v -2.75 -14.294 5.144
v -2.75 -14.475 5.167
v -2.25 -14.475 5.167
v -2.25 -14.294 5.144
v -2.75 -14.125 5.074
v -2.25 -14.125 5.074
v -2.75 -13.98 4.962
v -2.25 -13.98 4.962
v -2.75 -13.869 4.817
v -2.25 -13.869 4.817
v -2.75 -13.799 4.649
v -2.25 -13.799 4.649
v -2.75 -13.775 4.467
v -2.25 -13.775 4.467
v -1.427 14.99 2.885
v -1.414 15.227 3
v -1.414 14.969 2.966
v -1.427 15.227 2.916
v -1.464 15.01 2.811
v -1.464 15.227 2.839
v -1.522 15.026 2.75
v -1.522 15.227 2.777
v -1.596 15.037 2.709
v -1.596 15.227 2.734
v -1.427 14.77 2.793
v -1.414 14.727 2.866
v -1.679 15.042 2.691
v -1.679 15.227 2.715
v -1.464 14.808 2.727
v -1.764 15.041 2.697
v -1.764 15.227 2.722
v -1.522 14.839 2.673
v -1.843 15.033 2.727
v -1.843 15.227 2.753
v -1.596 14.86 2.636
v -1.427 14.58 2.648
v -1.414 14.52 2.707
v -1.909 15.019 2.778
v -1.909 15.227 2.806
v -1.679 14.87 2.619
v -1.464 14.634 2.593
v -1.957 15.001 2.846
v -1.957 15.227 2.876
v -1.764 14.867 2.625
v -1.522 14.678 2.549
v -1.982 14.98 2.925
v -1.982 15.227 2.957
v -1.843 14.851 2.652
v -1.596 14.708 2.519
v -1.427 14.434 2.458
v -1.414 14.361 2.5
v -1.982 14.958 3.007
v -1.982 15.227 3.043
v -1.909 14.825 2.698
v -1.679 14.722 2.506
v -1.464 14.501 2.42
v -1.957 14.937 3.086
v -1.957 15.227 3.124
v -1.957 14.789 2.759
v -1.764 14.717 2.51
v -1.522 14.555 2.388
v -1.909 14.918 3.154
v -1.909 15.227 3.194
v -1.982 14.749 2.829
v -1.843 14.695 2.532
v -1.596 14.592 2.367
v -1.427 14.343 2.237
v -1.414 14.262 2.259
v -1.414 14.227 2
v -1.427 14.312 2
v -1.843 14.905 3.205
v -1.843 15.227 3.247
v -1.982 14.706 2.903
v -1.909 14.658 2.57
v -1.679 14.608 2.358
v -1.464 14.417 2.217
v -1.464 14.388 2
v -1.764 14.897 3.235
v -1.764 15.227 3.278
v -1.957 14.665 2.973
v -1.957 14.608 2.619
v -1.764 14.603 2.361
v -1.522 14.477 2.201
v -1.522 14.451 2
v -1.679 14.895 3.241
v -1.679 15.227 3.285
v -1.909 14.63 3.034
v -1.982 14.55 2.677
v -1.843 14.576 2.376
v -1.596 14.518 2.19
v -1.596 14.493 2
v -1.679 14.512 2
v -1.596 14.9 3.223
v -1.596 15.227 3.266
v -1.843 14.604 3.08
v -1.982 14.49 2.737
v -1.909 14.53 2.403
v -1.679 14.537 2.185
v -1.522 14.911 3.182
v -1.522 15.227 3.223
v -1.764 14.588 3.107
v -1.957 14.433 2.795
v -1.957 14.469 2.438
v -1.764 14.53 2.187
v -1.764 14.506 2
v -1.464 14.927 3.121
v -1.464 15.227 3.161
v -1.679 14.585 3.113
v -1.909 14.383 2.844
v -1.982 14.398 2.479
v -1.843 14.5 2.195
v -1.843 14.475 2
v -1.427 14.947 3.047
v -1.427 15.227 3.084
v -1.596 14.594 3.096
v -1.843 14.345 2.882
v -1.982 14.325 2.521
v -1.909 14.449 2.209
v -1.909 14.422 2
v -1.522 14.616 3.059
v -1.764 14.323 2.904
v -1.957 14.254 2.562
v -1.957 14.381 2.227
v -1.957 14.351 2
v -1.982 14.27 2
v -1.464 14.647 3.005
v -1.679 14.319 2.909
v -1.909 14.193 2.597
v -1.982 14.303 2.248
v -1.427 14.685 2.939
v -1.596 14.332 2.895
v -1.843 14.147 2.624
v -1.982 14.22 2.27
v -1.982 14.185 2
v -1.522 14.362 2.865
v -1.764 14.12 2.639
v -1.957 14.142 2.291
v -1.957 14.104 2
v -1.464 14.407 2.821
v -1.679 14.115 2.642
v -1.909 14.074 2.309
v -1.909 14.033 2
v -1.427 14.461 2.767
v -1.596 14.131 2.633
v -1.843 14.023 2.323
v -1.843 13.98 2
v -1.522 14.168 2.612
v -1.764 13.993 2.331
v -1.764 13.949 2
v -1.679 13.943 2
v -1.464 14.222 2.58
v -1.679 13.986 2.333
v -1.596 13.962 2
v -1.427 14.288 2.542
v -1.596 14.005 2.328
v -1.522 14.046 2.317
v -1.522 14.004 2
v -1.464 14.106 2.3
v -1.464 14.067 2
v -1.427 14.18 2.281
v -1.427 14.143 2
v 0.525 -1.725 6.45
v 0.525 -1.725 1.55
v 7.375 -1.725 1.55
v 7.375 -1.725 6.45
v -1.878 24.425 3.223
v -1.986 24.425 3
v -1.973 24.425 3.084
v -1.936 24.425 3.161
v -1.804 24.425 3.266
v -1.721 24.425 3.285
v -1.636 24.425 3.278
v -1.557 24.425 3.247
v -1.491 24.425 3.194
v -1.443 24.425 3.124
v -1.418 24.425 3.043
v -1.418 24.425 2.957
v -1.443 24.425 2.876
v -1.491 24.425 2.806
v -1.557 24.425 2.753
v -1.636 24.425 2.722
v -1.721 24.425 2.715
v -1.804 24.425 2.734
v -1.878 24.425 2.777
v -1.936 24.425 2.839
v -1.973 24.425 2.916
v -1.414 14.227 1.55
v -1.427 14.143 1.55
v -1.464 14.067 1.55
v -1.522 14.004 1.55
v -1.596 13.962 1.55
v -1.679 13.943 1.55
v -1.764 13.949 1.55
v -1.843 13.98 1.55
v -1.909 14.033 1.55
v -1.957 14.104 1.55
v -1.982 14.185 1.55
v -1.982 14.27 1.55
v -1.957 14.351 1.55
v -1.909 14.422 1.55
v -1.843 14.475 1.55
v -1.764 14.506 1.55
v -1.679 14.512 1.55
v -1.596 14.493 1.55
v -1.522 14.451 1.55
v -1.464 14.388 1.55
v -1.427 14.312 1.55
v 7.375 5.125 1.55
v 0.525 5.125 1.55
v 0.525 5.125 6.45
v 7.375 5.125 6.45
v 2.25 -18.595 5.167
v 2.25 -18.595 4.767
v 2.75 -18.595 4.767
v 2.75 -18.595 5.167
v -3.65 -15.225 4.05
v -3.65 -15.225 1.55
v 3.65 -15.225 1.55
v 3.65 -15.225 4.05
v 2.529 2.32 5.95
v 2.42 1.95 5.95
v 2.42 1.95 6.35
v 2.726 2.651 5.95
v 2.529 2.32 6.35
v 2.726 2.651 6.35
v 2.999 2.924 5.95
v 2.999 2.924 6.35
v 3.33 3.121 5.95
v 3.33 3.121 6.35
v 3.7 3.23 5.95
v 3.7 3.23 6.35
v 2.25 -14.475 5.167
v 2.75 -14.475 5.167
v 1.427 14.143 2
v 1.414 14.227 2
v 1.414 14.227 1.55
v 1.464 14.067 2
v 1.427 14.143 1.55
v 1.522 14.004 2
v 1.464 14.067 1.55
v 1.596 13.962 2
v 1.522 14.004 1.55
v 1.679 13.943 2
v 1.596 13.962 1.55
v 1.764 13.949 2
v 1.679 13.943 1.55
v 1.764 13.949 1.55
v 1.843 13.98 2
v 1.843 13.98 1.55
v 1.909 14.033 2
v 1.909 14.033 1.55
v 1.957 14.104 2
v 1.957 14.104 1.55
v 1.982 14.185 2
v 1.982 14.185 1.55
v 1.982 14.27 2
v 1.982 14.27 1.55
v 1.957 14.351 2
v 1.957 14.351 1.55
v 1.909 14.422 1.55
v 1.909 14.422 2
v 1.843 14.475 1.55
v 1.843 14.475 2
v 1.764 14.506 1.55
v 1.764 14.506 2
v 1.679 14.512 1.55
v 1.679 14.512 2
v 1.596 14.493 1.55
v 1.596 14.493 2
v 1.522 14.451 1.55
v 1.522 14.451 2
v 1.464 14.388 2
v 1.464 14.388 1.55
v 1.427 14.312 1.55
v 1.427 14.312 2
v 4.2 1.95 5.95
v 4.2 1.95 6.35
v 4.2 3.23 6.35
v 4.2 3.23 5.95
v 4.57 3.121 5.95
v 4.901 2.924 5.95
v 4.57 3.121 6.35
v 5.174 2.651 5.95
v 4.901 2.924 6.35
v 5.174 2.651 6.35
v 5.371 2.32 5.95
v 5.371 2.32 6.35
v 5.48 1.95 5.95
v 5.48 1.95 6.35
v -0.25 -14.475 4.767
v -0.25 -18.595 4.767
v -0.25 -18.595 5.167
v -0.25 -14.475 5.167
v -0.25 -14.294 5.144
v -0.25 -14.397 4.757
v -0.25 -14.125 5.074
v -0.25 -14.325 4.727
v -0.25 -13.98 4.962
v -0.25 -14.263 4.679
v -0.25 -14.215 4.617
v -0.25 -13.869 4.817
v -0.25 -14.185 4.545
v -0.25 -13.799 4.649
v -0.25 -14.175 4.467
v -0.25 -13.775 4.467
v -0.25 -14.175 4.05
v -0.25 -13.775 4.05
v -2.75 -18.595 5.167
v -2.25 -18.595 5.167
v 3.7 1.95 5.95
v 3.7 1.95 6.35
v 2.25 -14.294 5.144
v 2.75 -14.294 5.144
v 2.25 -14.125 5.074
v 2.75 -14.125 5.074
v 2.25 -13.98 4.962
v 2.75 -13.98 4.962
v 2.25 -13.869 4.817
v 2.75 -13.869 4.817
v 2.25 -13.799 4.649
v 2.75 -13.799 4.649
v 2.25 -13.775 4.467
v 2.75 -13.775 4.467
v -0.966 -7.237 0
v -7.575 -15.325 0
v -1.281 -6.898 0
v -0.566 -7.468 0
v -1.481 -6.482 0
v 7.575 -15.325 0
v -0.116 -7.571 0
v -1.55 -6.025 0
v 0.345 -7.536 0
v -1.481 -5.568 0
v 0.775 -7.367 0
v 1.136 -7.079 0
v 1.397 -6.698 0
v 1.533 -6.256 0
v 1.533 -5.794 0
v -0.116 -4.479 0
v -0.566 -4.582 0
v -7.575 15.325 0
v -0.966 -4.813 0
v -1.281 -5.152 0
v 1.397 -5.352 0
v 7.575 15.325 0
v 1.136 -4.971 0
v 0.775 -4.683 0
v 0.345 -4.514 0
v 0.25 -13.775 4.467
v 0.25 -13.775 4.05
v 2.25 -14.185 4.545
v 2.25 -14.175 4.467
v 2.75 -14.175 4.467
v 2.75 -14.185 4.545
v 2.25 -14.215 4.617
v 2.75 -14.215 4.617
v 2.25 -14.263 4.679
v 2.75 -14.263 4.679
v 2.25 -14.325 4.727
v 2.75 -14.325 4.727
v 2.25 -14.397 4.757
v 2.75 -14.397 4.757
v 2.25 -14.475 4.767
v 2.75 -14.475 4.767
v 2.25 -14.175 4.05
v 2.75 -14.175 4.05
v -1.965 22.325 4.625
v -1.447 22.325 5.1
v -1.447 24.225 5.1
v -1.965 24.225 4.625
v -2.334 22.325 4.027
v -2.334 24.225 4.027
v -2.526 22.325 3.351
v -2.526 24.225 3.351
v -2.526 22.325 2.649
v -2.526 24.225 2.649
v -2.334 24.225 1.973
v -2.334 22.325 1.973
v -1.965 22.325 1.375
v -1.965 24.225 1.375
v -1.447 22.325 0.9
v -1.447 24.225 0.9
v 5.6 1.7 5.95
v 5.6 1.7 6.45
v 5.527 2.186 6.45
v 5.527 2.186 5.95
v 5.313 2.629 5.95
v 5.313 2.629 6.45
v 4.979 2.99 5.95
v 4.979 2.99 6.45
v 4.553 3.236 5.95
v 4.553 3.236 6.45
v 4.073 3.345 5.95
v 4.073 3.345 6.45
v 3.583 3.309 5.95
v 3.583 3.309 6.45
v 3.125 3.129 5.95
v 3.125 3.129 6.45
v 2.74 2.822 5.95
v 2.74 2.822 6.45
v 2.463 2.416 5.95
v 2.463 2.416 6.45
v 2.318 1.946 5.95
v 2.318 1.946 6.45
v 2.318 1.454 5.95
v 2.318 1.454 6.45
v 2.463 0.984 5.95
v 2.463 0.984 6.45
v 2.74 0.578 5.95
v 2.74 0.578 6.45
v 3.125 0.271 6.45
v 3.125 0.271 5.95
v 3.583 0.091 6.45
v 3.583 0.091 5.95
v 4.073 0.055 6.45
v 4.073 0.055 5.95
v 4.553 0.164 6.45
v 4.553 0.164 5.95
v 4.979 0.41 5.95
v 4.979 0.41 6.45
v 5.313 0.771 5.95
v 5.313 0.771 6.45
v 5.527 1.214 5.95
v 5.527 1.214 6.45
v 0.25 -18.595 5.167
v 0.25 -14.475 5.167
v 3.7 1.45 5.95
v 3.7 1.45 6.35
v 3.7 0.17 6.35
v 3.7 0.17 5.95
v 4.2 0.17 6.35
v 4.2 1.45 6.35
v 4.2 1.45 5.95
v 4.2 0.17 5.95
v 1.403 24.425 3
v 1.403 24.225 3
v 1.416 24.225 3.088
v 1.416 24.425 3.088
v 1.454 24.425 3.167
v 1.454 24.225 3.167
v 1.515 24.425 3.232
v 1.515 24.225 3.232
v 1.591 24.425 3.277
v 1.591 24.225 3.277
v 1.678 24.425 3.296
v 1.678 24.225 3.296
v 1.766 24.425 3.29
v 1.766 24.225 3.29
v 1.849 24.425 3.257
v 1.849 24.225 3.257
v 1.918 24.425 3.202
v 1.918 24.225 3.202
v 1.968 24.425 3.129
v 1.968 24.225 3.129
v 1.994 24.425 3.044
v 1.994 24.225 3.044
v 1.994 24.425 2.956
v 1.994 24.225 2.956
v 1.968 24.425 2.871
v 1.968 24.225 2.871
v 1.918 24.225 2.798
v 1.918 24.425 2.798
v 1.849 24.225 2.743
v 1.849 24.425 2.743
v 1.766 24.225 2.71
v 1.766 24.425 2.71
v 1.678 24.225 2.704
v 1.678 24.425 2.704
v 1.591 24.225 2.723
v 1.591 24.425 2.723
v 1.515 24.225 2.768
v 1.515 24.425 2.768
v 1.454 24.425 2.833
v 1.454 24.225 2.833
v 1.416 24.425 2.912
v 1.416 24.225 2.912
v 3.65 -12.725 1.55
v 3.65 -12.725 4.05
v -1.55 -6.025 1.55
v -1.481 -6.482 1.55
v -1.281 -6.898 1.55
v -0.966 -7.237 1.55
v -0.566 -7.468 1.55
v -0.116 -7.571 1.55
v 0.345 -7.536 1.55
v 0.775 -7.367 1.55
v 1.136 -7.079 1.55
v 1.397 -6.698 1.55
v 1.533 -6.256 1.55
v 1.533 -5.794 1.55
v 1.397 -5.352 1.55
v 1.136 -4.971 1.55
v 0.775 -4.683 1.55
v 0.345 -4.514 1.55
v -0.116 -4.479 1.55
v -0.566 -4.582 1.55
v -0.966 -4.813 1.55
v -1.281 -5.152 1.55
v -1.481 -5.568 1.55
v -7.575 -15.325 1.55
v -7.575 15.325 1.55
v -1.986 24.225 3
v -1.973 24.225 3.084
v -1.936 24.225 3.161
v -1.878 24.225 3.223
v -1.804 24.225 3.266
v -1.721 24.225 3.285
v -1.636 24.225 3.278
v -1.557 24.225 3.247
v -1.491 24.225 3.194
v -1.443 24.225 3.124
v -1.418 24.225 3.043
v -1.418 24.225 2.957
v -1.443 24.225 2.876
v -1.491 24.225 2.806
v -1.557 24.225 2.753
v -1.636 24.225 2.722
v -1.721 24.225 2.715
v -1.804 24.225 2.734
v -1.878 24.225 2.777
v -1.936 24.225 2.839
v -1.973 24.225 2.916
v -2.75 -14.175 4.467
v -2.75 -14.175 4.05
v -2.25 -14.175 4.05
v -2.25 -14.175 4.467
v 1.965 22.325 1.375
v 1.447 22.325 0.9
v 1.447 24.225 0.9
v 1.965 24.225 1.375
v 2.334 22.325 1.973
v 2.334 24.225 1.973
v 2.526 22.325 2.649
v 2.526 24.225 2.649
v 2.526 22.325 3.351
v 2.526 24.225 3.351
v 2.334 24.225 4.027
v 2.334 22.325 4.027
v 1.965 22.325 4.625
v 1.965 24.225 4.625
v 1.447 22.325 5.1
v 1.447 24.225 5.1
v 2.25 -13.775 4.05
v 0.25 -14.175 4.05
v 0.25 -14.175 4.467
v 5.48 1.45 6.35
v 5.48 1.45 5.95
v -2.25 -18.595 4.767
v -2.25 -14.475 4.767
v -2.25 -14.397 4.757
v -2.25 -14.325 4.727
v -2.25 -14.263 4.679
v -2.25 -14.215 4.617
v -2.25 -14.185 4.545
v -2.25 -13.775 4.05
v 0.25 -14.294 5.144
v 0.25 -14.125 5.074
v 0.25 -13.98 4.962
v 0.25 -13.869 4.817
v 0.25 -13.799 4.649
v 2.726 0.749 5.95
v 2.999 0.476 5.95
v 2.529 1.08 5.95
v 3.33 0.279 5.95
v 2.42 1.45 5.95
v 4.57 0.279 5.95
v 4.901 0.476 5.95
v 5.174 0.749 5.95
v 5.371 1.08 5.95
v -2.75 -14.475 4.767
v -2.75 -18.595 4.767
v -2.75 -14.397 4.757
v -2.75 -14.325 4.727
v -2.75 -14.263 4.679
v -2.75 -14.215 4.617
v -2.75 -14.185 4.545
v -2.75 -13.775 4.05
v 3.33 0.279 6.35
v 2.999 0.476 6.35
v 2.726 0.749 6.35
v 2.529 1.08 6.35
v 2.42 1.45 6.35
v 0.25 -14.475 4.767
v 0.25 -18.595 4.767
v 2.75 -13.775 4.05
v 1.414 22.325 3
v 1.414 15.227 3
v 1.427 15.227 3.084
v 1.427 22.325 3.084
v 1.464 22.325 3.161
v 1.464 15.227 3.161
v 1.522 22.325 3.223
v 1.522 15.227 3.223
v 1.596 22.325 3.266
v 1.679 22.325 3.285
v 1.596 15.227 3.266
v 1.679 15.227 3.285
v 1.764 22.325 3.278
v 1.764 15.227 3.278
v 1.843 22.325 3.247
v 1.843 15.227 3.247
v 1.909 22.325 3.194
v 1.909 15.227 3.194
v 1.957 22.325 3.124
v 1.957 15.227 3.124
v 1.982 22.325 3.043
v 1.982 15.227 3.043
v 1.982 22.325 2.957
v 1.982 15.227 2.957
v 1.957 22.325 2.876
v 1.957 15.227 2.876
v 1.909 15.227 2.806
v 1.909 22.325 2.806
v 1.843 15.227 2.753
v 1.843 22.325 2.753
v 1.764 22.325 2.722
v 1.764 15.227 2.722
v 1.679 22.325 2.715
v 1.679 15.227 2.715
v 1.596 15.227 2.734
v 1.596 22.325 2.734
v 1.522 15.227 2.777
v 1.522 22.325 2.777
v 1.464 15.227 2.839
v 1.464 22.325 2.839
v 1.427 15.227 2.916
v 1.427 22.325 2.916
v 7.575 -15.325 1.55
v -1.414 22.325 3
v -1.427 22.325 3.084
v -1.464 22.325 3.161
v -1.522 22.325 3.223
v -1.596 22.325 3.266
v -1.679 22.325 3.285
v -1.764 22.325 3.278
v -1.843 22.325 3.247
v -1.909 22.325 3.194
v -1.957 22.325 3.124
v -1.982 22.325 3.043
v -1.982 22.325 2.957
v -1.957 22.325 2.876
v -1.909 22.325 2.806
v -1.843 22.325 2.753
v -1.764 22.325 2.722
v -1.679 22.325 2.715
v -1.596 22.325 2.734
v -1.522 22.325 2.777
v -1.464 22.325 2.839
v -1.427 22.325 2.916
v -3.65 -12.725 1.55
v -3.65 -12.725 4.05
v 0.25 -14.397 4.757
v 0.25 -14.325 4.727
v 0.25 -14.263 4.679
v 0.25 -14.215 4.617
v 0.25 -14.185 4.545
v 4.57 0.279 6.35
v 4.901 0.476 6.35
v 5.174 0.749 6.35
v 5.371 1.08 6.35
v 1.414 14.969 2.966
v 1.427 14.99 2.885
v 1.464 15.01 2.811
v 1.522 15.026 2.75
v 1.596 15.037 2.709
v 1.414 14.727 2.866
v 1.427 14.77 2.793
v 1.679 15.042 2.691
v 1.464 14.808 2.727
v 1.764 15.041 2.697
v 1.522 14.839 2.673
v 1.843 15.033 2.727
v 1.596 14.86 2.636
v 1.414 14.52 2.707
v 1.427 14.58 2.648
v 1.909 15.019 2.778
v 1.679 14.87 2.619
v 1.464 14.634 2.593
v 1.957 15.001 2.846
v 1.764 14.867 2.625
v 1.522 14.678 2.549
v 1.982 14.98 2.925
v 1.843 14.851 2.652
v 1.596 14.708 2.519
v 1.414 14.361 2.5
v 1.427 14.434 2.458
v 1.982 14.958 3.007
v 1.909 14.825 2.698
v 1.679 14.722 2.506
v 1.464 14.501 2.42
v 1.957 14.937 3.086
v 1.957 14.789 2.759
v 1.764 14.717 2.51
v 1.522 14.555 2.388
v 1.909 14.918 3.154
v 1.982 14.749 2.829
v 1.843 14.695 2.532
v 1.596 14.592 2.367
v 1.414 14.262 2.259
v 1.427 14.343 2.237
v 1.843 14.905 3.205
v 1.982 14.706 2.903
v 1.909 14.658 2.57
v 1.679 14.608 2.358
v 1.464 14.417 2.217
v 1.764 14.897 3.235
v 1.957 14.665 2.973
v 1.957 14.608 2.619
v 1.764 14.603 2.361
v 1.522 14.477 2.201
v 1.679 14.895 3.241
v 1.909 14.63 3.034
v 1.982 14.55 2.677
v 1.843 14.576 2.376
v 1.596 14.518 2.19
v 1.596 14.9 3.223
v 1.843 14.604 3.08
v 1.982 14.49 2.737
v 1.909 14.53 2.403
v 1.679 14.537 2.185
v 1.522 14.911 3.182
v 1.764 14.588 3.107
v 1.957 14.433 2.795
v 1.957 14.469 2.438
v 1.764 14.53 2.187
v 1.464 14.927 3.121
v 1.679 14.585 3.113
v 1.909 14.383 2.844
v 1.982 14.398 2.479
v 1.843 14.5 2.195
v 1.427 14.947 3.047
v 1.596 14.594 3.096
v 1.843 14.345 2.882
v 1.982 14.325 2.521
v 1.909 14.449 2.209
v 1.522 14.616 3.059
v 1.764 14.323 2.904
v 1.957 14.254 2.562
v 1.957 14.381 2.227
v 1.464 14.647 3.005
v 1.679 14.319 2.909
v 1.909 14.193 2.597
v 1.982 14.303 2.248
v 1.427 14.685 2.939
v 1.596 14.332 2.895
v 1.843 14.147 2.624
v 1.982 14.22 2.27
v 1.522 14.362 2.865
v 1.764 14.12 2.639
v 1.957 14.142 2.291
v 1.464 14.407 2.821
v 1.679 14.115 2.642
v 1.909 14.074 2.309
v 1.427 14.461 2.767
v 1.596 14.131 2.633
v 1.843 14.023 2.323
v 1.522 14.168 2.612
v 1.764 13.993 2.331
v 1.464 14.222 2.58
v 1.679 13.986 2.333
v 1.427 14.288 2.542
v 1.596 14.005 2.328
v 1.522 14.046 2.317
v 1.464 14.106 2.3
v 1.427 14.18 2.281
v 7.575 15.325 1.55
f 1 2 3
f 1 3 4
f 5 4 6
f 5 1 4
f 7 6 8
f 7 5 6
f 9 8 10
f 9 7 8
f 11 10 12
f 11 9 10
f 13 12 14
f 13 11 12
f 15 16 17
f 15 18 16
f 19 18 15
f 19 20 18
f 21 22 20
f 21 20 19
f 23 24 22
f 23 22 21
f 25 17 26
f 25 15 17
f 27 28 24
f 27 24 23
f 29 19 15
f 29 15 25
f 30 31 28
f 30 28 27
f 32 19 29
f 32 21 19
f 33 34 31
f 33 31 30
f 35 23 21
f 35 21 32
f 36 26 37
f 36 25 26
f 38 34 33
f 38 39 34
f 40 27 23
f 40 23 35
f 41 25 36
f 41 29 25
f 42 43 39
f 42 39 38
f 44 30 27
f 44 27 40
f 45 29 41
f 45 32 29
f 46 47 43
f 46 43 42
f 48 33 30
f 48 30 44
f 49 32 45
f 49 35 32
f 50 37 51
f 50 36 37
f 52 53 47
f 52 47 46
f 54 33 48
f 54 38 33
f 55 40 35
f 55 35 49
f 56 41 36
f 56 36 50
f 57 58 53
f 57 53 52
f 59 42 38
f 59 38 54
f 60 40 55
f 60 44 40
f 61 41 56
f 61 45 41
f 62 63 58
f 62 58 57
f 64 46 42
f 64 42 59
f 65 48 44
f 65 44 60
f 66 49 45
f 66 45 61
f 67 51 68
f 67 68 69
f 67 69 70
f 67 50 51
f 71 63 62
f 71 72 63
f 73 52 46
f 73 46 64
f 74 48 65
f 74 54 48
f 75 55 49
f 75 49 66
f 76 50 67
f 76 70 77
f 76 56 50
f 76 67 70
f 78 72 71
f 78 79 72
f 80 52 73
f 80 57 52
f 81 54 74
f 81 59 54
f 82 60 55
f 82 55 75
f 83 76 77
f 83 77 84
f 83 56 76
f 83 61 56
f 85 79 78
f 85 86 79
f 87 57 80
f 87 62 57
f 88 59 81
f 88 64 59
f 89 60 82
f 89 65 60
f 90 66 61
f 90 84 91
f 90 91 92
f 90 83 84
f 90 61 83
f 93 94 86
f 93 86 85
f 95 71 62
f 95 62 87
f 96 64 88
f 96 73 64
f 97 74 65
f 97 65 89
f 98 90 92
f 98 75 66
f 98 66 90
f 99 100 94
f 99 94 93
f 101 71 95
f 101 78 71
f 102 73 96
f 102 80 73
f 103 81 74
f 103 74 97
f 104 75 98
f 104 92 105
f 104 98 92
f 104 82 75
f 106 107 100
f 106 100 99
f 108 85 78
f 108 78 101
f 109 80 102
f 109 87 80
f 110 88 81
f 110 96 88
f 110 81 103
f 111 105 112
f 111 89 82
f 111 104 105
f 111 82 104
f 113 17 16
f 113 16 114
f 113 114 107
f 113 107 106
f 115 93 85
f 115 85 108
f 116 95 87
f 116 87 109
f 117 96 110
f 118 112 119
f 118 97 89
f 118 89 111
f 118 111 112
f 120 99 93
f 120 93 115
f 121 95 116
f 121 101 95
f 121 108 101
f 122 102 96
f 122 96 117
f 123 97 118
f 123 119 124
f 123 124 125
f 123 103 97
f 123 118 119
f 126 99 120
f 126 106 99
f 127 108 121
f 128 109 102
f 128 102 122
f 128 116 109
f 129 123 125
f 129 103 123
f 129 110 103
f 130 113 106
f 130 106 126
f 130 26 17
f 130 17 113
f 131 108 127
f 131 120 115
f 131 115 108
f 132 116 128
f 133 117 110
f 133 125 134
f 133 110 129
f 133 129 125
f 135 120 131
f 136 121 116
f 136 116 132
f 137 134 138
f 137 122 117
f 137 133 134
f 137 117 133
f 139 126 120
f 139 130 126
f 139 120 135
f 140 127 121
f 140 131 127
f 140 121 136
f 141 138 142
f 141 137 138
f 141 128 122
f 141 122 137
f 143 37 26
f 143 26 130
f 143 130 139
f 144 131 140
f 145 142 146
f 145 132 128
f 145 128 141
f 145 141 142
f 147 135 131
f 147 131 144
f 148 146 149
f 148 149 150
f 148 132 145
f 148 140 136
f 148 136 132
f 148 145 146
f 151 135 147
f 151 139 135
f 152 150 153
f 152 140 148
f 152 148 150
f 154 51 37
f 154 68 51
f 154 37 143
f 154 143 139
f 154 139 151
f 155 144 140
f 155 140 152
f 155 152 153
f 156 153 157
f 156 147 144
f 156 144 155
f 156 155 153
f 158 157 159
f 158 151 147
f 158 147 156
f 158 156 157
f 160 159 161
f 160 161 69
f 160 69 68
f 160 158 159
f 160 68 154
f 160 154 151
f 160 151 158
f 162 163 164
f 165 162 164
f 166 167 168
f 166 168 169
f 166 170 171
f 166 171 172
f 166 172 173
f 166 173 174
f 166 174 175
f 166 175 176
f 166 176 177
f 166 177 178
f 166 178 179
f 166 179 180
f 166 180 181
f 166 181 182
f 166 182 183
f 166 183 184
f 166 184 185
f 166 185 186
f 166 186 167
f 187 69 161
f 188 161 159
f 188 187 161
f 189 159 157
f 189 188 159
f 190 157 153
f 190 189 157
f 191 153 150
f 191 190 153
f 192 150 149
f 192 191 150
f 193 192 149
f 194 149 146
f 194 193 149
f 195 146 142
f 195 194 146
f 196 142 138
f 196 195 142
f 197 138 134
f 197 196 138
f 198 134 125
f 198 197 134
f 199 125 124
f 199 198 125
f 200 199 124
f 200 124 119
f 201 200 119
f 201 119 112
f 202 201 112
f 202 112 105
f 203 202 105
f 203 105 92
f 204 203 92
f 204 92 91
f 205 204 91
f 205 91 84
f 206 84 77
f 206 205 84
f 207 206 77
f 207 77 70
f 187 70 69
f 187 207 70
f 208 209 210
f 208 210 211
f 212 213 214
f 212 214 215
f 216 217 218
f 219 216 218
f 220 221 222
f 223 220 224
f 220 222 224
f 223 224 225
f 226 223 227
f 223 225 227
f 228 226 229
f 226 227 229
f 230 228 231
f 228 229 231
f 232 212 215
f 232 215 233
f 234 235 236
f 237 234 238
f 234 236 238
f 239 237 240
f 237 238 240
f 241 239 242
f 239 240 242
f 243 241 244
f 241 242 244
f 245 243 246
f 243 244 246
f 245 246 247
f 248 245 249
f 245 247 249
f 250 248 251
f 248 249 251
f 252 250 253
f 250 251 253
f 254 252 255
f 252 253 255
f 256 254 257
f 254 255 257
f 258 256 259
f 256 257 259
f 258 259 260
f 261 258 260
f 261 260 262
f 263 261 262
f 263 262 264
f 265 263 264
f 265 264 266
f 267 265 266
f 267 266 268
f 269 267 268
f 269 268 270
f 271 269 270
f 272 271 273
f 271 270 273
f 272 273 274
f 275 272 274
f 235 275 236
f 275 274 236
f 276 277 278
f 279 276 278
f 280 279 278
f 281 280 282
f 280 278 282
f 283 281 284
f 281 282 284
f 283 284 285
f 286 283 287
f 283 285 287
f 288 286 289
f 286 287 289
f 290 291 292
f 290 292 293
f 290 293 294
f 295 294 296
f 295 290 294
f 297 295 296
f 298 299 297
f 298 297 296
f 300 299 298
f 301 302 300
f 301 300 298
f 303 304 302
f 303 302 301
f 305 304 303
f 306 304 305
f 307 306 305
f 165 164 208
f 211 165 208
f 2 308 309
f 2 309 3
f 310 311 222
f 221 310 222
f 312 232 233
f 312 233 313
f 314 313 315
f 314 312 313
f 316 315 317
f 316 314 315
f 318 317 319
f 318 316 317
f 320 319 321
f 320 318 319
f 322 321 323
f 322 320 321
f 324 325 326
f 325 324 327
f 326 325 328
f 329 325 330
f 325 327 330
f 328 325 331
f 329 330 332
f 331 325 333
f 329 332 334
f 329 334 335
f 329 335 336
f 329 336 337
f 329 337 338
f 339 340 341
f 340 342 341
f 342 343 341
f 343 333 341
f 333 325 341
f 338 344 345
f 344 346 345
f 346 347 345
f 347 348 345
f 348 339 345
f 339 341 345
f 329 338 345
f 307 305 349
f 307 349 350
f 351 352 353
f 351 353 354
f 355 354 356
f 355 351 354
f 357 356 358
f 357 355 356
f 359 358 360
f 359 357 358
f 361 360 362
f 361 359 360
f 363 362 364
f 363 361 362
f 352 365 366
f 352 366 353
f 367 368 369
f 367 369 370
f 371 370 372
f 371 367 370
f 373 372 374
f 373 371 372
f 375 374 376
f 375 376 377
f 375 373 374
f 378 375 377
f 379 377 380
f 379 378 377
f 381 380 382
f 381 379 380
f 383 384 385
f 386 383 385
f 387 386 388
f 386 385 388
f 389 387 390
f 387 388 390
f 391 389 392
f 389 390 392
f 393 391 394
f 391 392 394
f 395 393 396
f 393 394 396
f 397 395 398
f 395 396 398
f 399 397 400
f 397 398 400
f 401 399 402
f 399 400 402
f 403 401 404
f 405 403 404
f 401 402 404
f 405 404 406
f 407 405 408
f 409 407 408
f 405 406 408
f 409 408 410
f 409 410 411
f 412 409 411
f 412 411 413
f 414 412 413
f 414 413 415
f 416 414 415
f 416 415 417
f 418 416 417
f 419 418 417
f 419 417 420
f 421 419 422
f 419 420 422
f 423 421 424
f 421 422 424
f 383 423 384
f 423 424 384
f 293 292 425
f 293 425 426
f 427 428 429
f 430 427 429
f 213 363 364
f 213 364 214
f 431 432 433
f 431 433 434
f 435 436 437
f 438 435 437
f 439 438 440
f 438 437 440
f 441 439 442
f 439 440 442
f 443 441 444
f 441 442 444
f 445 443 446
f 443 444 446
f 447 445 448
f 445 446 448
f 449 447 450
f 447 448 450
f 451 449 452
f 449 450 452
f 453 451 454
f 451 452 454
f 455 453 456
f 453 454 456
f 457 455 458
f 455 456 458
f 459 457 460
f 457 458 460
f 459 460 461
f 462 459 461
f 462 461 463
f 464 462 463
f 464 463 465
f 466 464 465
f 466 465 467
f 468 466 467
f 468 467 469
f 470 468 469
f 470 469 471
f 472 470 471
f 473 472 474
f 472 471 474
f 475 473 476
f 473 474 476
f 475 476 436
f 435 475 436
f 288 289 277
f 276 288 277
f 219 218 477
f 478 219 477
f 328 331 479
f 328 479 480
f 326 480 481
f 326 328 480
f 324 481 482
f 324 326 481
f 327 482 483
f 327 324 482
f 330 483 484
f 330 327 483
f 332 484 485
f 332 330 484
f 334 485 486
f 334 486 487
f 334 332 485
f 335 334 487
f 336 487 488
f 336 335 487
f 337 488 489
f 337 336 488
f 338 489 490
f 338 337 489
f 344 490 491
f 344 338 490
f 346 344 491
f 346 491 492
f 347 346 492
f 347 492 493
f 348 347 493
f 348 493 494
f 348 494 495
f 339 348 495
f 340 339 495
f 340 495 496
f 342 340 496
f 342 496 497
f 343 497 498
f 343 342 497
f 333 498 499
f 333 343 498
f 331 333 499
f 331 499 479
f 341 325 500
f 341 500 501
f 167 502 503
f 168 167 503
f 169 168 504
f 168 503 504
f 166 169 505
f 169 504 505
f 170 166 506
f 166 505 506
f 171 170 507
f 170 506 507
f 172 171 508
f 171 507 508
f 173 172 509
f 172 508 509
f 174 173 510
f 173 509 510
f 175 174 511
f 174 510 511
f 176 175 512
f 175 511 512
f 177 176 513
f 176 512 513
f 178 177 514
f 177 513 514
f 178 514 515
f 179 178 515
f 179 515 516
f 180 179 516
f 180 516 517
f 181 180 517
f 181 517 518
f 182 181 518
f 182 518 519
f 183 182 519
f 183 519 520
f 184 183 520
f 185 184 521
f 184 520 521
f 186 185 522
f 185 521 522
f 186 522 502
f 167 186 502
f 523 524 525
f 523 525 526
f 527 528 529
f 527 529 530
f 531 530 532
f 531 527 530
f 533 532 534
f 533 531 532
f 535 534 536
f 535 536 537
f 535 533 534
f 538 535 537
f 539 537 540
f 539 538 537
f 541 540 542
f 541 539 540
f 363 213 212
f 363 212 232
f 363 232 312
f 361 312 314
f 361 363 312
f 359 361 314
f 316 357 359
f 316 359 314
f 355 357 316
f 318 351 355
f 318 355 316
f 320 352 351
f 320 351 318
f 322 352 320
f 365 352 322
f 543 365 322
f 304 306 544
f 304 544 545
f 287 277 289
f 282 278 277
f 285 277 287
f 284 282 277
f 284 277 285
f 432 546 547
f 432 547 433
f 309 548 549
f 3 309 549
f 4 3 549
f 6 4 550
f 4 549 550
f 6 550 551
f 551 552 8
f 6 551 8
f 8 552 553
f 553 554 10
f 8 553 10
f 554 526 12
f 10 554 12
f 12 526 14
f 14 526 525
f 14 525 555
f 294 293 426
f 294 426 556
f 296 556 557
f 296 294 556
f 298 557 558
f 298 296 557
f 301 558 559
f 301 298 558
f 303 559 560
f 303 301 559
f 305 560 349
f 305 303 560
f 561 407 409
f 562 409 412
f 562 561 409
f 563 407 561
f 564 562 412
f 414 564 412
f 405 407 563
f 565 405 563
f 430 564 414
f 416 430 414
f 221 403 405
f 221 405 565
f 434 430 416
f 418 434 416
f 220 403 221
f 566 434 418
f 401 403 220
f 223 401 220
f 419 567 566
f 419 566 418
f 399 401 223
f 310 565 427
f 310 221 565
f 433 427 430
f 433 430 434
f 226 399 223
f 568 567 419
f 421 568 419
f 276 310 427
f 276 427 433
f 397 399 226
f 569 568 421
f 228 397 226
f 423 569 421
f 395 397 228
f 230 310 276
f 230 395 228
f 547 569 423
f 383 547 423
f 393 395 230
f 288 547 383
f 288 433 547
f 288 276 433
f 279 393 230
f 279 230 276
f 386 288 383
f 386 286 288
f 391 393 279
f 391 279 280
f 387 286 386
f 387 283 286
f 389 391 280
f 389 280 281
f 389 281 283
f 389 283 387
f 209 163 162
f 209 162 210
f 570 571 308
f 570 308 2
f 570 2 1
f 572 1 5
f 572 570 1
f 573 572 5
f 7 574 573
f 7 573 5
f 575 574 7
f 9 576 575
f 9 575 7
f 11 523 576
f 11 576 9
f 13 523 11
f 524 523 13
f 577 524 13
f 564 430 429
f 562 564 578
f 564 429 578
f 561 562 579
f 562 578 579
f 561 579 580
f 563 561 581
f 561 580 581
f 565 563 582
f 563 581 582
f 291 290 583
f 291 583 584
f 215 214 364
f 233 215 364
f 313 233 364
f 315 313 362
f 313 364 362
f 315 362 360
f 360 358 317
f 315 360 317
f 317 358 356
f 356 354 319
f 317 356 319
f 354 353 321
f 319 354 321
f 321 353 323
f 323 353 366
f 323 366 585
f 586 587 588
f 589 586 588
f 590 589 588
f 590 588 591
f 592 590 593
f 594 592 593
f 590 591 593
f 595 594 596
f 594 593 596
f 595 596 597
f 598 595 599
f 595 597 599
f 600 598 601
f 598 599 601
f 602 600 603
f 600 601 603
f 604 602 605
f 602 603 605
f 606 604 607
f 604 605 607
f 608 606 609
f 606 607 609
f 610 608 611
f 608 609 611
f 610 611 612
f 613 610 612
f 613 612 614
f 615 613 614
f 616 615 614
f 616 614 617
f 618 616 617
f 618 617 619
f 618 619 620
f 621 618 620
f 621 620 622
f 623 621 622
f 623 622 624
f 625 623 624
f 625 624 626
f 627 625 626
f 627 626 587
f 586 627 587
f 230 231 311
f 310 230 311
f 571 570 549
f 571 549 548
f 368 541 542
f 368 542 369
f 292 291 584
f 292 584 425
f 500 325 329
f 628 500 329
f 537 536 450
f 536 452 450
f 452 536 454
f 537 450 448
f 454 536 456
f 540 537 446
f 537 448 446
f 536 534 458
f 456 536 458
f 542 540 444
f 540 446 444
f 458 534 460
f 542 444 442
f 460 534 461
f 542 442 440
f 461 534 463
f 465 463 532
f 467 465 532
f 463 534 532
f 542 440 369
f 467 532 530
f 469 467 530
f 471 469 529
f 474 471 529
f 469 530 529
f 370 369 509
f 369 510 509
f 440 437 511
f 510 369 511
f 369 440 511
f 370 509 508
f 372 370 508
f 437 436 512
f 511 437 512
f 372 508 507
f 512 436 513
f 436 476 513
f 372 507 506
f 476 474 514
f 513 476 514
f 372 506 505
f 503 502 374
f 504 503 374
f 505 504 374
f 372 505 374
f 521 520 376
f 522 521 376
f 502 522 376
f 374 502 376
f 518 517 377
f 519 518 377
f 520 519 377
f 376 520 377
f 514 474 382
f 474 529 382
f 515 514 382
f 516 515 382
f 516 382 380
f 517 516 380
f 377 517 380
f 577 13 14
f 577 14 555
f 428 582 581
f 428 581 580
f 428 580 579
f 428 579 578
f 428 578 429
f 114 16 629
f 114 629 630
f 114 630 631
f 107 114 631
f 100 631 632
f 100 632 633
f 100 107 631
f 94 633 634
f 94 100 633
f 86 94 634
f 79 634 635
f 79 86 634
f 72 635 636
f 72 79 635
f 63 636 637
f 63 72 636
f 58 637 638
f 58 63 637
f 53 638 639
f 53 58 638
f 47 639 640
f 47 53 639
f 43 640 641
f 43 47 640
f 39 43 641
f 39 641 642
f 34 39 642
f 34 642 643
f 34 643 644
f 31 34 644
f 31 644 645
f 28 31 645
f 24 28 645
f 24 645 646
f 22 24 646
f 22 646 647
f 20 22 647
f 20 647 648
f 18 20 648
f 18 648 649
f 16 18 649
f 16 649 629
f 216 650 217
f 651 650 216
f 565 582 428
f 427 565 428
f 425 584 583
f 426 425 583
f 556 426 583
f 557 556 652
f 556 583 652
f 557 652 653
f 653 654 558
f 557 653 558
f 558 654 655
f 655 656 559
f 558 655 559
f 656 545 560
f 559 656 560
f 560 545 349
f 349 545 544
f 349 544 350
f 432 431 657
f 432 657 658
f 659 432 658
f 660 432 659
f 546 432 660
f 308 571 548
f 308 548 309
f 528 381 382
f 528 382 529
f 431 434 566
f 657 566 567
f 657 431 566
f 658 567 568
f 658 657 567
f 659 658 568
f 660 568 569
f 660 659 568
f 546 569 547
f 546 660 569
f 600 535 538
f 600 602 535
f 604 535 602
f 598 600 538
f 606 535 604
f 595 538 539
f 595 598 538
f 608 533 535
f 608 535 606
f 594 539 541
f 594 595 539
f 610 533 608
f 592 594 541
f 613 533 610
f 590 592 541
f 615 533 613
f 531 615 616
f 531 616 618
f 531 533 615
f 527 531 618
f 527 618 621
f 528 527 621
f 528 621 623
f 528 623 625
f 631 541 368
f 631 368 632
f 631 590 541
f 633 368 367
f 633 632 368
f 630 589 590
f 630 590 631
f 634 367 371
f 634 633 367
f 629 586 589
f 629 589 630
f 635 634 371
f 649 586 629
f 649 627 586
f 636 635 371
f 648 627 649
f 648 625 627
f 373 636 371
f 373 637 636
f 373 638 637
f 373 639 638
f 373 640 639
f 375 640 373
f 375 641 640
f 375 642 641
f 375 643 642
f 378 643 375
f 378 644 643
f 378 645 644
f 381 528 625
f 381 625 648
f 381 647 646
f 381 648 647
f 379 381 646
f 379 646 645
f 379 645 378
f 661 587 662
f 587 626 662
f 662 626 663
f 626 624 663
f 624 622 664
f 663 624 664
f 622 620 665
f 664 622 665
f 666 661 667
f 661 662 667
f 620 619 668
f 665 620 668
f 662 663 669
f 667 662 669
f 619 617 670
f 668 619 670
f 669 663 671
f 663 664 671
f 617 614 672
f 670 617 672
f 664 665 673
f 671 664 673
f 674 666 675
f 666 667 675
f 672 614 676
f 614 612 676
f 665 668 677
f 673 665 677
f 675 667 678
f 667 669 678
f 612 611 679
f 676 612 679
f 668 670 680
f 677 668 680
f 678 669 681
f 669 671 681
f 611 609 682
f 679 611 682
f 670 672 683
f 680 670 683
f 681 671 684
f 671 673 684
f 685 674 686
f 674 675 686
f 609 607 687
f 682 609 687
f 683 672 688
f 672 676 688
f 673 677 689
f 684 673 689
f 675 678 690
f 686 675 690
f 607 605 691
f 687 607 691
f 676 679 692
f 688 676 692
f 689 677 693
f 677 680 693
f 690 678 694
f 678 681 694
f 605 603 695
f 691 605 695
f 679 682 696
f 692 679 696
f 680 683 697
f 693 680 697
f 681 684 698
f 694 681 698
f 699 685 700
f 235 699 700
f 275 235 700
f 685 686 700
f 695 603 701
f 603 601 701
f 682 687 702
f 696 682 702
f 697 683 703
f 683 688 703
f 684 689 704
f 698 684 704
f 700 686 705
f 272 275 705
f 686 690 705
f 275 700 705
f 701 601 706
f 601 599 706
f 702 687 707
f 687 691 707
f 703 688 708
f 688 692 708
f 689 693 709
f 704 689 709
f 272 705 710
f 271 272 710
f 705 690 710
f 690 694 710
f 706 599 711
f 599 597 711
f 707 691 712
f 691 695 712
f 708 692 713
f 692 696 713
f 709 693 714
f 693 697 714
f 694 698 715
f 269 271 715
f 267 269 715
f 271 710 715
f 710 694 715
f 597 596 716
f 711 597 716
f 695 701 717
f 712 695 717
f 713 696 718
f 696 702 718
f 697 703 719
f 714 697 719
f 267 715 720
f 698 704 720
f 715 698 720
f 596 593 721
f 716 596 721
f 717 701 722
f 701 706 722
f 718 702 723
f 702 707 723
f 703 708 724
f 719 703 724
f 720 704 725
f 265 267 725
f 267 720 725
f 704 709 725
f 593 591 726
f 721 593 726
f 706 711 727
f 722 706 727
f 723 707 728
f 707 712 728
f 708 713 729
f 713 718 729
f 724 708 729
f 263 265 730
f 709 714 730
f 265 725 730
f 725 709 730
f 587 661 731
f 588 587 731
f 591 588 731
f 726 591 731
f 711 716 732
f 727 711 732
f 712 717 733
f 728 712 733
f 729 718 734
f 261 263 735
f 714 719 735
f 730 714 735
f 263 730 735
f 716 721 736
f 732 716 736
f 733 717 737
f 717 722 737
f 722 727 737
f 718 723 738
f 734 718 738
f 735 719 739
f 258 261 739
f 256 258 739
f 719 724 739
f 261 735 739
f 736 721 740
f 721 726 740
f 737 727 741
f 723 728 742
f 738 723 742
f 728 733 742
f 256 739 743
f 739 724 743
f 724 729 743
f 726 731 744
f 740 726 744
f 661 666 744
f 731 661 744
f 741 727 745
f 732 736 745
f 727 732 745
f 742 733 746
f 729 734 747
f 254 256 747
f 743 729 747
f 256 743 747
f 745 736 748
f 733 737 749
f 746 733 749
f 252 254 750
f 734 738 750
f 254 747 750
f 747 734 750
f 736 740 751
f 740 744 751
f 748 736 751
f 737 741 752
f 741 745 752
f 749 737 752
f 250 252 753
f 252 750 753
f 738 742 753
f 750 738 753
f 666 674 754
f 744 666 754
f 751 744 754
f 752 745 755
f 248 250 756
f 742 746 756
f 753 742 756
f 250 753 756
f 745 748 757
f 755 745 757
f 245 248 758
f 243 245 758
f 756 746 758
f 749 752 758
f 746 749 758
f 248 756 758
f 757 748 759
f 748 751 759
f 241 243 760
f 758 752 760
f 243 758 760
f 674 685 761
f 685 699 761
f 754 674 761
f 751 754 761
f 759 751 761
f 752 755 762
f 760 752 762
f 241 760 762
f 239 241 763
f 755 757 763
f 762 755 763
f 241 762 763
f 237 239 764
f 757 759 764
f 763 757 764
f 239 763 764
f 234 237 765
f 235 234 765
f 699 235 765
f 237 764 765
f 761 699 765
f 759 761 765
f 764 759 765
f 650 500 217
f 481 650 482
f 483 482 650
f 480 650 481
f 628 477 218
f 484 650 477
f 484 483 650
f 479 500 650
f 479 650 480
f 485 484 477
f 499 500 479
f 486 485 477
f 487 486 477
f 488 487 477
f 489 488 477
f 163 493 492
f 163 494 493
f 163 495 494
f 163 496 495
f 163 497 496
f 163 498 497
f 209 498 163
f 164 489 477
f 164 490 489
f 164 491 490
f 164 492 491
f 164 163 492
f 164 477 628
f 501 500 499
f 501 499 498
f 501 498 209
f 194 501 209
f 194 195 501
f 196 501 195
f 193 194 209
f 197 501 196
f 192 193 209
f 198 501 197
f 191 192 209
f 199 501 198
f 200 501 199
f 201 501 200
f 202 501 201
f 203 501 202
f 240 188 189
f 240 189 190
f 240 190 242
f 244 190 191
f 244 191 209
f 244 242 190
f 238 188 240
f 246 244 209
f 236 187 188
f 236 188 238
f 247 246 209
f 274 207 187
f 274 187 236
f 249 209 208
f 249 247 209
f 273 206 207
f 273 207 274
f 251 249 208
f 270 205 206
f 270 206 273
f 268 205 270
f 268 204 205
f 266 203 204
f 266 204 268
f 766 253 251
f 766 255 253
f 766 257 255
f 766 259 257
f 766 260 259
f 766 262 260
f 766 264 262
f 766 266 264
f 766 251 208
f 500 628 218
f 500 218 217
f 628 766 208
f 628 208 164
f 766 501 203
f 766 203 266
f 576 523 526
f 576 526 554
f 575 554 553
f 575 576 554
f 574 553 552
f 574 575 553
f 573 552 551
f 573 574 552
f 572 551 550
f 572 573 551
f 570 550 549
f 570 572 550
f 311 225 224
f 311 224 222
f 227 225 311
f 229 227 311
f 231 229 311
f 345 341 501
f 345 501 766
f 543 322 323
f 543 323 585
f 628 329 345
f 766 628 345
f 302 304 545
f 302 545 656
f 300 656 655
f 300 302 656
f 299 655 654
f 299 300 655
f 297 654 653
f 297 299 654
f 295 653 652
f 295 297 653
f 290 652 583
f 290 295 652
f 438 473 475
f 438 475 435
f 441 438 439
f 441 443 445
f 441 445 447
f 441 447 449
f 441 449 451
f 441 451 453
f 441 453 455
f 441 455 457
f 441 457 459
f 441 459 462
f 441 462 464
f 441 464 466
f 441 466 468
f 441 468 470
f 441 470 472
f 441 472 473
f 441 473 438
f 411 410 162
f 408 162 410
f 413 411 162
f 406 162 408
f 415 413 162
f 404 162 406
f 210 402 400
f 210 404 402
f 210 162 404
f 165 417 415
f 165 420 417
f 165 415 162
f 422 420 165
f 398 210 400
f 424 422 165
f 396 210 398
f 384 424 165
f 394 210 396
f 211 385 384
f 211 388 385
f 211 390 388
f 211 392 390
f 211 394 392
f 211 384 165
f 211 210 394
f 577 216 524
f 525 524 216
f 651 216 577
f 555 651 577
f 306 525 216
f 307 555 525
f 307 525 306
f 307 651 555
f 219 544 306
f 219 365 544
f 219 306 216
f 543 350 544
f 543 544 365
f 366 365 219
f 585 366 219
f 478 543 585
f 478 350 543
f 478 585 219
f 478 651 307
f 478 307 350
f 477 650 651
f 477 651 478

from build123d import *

# Parameters (mm, degrees)
ESBO_O1_W                = 15.15
ESBO_O1_H                = 30.65
ESBO_O1_R                = 1.55
RESSALTO_EXTRUS_O1_DEPTH = 1.55
ESBO_O2_W                = 6.85
ESBO_O2_H                = 6.85
RESSALTO_EXTRUS_O2_DEPTH = 6.45
ESBO_O3_R                = 1.65
CORTE_EXTRUS_O1_DEPTH    = 0.5
ESBO_O4_W                = 7.3
ESBO_O4_H                = 2.5
RESSALTO_EXTRUS_O3_DEPTH = 4.05
RESSALTO_EXTRUS_O5_DEPTH = 7.398508
ESBO_O12_W               = 1.34798559
ESBO_O12_H               = 5.991047065
ESBO_O12_W_2             = 0.998507844
ESBO_O12_W_3             = 2
CORTE_EXTRUS_O2_DEPTH    = 10
ESBO_O9_R                = 1.55
CORTE_EXTRUS_O3_DEPTH    = 0.1
RESSALTO_EXTRUS_O6_DEPTH = 1.9
ESBO_O18_R               = 0.297205441
ESBO_O18_R_2             = 0.285630525
RESSALTO_EXTRUS_O7_DEPTH = 0.2
ESBO_O25_R               = 0.285630525


with BuildPart() as part:
    # Esboço1 → Ressalto-extrusão1 (new body)
    with BuildSketch(Plane.XY):
        Rectangle(ESBO_O1_W, ESBO_O1_H)
        with Locations(Location((0, -6.025, 0), (0, 0, 180))):
            Circle(ESBO_O1_R, mode=Mode.SUBTRACT)
    extrude(amount=RESSALTO_EXTRUS_O1_DEPTH)

    # Esboço2 → Ressalto-extrusão2 (add)
    with BuildSketch(Plane.XY):
        with Locations((3.95, 1.7)):
            Rectangle(ESBO_O2_W, ESBO_O2_H)
    extrude(amount=RESSALTO_EXTRUS_O2_DEPTH)

    # Esboço3 → Corte-extrusão1 (cut)
    with BuildSketch(Plane.XY.offset(6.45)):
        with Locations((3.95, 1.7)):
            Circle(ESBO_O3_R)
        with BuildLine():
            Line((3.7, 1.95), (2.420294146, 1.95))
            ThreePointArc((2.420294146, 1.95), (2.853984489, 2.796015511), (3.7, 3.229705854))
            Line((3.7, 3.229705854), (3.7, 1.95))
        make_face(mode=Mode.SUBTRACT)
        with BuildLine():
            Line((5.479705854, 1.45), (4.2, 1.45))
            Line((4.2, 1.45), (4.2, 0.170294146))
            ThreePointArc((4.2, 0.170294146), (5.046015511, 0.603984489), (5.479705854, 1.45))
        make_face(mode=Mode.SUBTRACT)
        with BuildLine():
            Line((5.479705854, 1.95), (4.2, 1.95))
            Line((4.2, 1.95), (4.2, 3.229705854))
            ThreePointArc((4.2, 3.229705854), (5.046015511, 2.796015511), (5.479705854, 1.95))
        make_face(mode=Mode.SUBTRACT)
        with BuildLine():
            Line((3.7, 1.45), (3.7, 0.170294146))
            ThreePointArc((3.7, 0.170294146), (2.853984489, 0.603984489), (2.420294146, 1.45))
            Line((2.420294146, 1.45), (3.7, 1.45))
        make_face(mode=Mode.SUBTRACT)
    extrude(amount=-CORTE_EXTRUS_O1_DEPTH, mode=Mode.SUBTRACT)

    # Esboço4 → Ressalto-extrusão3 (add)
    with BuildSketch(Plane.XY):
        with Locations((0, -13.975)):
            Rectangle(ESBO_O4_W, ESBO_O4_H)
    extrude(amount=RESSALTO_EXTRUS_O3_DEPTH)

    # Esboço11 → Ressalto-extrusão5 (add)
    with BuildSketch(Plane.ZY.offset(3.65)):
        with BuildLine():
            Line((4.05, -14.175), (4.467357012, -14.175))
            ThreePointArc((4.467357012, -14.175), (4.679489046, -14.262867966), (4.767357012, -14.475))
            Line((4.767357012, -14.475), (4.767357012, -18.595051461))
            Line((4.767357012, -18.595051461), (5.167357012, -18.595051461))
            Line((5.167357012, -18.595051461), (5.167357012, -14.475))
            ThreePointArc((5.167357012, -14.475), (4.962331759, -13.980025253), (4.467357012, -13.775))
            Line((4.467357012, -13.775), (4.05, -13.775))
            Line((4.05, -13.775), (4.05, -14.175))
        make_face()
    extrude(amount=-RESSALTO_EXTRUS_O5_DEPTH)

    # Esboço12 → Corte-extrusão2 (cut)
    with BuildSketch(Plane.XY.offset(4.05)):
        with Locations((-3.423992795, -16.372351479)):
            Rectangle(ESBO_O12_W, ESBO_O12_H)
        with Locations((3.249253922, -16.372351479)):
            Rectangle(ESBO_O12_W_2, ESBO_O12_H)
        with Locations((-1.25, -16.372351479)):
            Rectangle(ESBO_O12_W_3, ESBO_O12_H)
        with Locations((1.25, -16.372351479)):
            Rectangle(ESBO_O12_W_3, ESBO_O12_H)
    extrude(amount=CORTE_EXTRUS_O2_DEPTH, mode=Mode.SUBTRACT)

    # Esboço9 → Corte-extrusão3 (cut)
    with BuildSketch(Plane.XY.offset(6.45)):
        with Locations((3.95, 1.7)):
            Circle(ESBO_O9_R)
    extrude(amount=-CORTE_EXTRUS_O3_DEPTH, mode=Mode.SUBTRACT)



with BuildPart() as body_2:
    # Esboço17 → Ressalto-extrusão6 (new body)
    with BuildSketch(Plane(origin=(0, 22.325, 0), x_dir=(1, 0, 0), z_dir=(0, 1, 0))):
        with BuildLine():
            Line((-1.446547614, -0.9), (1.446547614, -0.9))
            ThreePointArc((1.446547614, -0.9), (2.55, -3), (1.446547614, -5.1))
            Line((1.446547614, -5.1), (-1.446547614, -5.1))
            ThreePointArc((-1.446547614, -5.1), (-2.55, -3), (-1.446547614, -0.9))
        make_face()
    extrude(amount=RESSALTO_EXTRUS_O6_DEPTH)

    # Esboço18 → Ressalto-extrusão7 (add)
    with BuildSketch(Plane(origin=(0, 24.225, 0), x_dir=(1, 0, 0), z_dir=(0, 1, 0))):
        with Locations(Location((1.7, -3, 0), (0, 0, 180))):
            Circle(ESBO_O18_R)
        with Locations(Location((-1.7, -3, 0), (0, 0, 180))):
            Circle(ESBO_O18_R_2)
    extrude(amount=RESSALTO_EXTRUS_O7_DEPTH)


with BuildPart() as part_1:
    add(part.part)

    add(body_2.part)  # Varredura5 merges body 2
    # Varredura5: sweep along a path in Esboço19
    with BuildLine(Plane.ZY.offset(1.7)) as varredura5_path:
        Line((3, 22.325), (3, 15.227434518))
        ThreePointArc((3, 15.227434518), (2.707106781, 14.520327737), (2, 14.227434518))
        Line((2, 14.227434518), (1.55, 14.227434518))
    # Esboço25 → Varredura5 (sweep)
    with BuildSketch(Plane.XZ.offset(-22.325)):
        with Locations((-1.7, 3)):
            Circle(ESBO_O25_R)
    varredura5 = sweep(path=varredura5_path.line)

    # Espelhar1: Varredura5 across plane
    add(varredura5.mirror(Plane.ZY))


solid = part_1.part
